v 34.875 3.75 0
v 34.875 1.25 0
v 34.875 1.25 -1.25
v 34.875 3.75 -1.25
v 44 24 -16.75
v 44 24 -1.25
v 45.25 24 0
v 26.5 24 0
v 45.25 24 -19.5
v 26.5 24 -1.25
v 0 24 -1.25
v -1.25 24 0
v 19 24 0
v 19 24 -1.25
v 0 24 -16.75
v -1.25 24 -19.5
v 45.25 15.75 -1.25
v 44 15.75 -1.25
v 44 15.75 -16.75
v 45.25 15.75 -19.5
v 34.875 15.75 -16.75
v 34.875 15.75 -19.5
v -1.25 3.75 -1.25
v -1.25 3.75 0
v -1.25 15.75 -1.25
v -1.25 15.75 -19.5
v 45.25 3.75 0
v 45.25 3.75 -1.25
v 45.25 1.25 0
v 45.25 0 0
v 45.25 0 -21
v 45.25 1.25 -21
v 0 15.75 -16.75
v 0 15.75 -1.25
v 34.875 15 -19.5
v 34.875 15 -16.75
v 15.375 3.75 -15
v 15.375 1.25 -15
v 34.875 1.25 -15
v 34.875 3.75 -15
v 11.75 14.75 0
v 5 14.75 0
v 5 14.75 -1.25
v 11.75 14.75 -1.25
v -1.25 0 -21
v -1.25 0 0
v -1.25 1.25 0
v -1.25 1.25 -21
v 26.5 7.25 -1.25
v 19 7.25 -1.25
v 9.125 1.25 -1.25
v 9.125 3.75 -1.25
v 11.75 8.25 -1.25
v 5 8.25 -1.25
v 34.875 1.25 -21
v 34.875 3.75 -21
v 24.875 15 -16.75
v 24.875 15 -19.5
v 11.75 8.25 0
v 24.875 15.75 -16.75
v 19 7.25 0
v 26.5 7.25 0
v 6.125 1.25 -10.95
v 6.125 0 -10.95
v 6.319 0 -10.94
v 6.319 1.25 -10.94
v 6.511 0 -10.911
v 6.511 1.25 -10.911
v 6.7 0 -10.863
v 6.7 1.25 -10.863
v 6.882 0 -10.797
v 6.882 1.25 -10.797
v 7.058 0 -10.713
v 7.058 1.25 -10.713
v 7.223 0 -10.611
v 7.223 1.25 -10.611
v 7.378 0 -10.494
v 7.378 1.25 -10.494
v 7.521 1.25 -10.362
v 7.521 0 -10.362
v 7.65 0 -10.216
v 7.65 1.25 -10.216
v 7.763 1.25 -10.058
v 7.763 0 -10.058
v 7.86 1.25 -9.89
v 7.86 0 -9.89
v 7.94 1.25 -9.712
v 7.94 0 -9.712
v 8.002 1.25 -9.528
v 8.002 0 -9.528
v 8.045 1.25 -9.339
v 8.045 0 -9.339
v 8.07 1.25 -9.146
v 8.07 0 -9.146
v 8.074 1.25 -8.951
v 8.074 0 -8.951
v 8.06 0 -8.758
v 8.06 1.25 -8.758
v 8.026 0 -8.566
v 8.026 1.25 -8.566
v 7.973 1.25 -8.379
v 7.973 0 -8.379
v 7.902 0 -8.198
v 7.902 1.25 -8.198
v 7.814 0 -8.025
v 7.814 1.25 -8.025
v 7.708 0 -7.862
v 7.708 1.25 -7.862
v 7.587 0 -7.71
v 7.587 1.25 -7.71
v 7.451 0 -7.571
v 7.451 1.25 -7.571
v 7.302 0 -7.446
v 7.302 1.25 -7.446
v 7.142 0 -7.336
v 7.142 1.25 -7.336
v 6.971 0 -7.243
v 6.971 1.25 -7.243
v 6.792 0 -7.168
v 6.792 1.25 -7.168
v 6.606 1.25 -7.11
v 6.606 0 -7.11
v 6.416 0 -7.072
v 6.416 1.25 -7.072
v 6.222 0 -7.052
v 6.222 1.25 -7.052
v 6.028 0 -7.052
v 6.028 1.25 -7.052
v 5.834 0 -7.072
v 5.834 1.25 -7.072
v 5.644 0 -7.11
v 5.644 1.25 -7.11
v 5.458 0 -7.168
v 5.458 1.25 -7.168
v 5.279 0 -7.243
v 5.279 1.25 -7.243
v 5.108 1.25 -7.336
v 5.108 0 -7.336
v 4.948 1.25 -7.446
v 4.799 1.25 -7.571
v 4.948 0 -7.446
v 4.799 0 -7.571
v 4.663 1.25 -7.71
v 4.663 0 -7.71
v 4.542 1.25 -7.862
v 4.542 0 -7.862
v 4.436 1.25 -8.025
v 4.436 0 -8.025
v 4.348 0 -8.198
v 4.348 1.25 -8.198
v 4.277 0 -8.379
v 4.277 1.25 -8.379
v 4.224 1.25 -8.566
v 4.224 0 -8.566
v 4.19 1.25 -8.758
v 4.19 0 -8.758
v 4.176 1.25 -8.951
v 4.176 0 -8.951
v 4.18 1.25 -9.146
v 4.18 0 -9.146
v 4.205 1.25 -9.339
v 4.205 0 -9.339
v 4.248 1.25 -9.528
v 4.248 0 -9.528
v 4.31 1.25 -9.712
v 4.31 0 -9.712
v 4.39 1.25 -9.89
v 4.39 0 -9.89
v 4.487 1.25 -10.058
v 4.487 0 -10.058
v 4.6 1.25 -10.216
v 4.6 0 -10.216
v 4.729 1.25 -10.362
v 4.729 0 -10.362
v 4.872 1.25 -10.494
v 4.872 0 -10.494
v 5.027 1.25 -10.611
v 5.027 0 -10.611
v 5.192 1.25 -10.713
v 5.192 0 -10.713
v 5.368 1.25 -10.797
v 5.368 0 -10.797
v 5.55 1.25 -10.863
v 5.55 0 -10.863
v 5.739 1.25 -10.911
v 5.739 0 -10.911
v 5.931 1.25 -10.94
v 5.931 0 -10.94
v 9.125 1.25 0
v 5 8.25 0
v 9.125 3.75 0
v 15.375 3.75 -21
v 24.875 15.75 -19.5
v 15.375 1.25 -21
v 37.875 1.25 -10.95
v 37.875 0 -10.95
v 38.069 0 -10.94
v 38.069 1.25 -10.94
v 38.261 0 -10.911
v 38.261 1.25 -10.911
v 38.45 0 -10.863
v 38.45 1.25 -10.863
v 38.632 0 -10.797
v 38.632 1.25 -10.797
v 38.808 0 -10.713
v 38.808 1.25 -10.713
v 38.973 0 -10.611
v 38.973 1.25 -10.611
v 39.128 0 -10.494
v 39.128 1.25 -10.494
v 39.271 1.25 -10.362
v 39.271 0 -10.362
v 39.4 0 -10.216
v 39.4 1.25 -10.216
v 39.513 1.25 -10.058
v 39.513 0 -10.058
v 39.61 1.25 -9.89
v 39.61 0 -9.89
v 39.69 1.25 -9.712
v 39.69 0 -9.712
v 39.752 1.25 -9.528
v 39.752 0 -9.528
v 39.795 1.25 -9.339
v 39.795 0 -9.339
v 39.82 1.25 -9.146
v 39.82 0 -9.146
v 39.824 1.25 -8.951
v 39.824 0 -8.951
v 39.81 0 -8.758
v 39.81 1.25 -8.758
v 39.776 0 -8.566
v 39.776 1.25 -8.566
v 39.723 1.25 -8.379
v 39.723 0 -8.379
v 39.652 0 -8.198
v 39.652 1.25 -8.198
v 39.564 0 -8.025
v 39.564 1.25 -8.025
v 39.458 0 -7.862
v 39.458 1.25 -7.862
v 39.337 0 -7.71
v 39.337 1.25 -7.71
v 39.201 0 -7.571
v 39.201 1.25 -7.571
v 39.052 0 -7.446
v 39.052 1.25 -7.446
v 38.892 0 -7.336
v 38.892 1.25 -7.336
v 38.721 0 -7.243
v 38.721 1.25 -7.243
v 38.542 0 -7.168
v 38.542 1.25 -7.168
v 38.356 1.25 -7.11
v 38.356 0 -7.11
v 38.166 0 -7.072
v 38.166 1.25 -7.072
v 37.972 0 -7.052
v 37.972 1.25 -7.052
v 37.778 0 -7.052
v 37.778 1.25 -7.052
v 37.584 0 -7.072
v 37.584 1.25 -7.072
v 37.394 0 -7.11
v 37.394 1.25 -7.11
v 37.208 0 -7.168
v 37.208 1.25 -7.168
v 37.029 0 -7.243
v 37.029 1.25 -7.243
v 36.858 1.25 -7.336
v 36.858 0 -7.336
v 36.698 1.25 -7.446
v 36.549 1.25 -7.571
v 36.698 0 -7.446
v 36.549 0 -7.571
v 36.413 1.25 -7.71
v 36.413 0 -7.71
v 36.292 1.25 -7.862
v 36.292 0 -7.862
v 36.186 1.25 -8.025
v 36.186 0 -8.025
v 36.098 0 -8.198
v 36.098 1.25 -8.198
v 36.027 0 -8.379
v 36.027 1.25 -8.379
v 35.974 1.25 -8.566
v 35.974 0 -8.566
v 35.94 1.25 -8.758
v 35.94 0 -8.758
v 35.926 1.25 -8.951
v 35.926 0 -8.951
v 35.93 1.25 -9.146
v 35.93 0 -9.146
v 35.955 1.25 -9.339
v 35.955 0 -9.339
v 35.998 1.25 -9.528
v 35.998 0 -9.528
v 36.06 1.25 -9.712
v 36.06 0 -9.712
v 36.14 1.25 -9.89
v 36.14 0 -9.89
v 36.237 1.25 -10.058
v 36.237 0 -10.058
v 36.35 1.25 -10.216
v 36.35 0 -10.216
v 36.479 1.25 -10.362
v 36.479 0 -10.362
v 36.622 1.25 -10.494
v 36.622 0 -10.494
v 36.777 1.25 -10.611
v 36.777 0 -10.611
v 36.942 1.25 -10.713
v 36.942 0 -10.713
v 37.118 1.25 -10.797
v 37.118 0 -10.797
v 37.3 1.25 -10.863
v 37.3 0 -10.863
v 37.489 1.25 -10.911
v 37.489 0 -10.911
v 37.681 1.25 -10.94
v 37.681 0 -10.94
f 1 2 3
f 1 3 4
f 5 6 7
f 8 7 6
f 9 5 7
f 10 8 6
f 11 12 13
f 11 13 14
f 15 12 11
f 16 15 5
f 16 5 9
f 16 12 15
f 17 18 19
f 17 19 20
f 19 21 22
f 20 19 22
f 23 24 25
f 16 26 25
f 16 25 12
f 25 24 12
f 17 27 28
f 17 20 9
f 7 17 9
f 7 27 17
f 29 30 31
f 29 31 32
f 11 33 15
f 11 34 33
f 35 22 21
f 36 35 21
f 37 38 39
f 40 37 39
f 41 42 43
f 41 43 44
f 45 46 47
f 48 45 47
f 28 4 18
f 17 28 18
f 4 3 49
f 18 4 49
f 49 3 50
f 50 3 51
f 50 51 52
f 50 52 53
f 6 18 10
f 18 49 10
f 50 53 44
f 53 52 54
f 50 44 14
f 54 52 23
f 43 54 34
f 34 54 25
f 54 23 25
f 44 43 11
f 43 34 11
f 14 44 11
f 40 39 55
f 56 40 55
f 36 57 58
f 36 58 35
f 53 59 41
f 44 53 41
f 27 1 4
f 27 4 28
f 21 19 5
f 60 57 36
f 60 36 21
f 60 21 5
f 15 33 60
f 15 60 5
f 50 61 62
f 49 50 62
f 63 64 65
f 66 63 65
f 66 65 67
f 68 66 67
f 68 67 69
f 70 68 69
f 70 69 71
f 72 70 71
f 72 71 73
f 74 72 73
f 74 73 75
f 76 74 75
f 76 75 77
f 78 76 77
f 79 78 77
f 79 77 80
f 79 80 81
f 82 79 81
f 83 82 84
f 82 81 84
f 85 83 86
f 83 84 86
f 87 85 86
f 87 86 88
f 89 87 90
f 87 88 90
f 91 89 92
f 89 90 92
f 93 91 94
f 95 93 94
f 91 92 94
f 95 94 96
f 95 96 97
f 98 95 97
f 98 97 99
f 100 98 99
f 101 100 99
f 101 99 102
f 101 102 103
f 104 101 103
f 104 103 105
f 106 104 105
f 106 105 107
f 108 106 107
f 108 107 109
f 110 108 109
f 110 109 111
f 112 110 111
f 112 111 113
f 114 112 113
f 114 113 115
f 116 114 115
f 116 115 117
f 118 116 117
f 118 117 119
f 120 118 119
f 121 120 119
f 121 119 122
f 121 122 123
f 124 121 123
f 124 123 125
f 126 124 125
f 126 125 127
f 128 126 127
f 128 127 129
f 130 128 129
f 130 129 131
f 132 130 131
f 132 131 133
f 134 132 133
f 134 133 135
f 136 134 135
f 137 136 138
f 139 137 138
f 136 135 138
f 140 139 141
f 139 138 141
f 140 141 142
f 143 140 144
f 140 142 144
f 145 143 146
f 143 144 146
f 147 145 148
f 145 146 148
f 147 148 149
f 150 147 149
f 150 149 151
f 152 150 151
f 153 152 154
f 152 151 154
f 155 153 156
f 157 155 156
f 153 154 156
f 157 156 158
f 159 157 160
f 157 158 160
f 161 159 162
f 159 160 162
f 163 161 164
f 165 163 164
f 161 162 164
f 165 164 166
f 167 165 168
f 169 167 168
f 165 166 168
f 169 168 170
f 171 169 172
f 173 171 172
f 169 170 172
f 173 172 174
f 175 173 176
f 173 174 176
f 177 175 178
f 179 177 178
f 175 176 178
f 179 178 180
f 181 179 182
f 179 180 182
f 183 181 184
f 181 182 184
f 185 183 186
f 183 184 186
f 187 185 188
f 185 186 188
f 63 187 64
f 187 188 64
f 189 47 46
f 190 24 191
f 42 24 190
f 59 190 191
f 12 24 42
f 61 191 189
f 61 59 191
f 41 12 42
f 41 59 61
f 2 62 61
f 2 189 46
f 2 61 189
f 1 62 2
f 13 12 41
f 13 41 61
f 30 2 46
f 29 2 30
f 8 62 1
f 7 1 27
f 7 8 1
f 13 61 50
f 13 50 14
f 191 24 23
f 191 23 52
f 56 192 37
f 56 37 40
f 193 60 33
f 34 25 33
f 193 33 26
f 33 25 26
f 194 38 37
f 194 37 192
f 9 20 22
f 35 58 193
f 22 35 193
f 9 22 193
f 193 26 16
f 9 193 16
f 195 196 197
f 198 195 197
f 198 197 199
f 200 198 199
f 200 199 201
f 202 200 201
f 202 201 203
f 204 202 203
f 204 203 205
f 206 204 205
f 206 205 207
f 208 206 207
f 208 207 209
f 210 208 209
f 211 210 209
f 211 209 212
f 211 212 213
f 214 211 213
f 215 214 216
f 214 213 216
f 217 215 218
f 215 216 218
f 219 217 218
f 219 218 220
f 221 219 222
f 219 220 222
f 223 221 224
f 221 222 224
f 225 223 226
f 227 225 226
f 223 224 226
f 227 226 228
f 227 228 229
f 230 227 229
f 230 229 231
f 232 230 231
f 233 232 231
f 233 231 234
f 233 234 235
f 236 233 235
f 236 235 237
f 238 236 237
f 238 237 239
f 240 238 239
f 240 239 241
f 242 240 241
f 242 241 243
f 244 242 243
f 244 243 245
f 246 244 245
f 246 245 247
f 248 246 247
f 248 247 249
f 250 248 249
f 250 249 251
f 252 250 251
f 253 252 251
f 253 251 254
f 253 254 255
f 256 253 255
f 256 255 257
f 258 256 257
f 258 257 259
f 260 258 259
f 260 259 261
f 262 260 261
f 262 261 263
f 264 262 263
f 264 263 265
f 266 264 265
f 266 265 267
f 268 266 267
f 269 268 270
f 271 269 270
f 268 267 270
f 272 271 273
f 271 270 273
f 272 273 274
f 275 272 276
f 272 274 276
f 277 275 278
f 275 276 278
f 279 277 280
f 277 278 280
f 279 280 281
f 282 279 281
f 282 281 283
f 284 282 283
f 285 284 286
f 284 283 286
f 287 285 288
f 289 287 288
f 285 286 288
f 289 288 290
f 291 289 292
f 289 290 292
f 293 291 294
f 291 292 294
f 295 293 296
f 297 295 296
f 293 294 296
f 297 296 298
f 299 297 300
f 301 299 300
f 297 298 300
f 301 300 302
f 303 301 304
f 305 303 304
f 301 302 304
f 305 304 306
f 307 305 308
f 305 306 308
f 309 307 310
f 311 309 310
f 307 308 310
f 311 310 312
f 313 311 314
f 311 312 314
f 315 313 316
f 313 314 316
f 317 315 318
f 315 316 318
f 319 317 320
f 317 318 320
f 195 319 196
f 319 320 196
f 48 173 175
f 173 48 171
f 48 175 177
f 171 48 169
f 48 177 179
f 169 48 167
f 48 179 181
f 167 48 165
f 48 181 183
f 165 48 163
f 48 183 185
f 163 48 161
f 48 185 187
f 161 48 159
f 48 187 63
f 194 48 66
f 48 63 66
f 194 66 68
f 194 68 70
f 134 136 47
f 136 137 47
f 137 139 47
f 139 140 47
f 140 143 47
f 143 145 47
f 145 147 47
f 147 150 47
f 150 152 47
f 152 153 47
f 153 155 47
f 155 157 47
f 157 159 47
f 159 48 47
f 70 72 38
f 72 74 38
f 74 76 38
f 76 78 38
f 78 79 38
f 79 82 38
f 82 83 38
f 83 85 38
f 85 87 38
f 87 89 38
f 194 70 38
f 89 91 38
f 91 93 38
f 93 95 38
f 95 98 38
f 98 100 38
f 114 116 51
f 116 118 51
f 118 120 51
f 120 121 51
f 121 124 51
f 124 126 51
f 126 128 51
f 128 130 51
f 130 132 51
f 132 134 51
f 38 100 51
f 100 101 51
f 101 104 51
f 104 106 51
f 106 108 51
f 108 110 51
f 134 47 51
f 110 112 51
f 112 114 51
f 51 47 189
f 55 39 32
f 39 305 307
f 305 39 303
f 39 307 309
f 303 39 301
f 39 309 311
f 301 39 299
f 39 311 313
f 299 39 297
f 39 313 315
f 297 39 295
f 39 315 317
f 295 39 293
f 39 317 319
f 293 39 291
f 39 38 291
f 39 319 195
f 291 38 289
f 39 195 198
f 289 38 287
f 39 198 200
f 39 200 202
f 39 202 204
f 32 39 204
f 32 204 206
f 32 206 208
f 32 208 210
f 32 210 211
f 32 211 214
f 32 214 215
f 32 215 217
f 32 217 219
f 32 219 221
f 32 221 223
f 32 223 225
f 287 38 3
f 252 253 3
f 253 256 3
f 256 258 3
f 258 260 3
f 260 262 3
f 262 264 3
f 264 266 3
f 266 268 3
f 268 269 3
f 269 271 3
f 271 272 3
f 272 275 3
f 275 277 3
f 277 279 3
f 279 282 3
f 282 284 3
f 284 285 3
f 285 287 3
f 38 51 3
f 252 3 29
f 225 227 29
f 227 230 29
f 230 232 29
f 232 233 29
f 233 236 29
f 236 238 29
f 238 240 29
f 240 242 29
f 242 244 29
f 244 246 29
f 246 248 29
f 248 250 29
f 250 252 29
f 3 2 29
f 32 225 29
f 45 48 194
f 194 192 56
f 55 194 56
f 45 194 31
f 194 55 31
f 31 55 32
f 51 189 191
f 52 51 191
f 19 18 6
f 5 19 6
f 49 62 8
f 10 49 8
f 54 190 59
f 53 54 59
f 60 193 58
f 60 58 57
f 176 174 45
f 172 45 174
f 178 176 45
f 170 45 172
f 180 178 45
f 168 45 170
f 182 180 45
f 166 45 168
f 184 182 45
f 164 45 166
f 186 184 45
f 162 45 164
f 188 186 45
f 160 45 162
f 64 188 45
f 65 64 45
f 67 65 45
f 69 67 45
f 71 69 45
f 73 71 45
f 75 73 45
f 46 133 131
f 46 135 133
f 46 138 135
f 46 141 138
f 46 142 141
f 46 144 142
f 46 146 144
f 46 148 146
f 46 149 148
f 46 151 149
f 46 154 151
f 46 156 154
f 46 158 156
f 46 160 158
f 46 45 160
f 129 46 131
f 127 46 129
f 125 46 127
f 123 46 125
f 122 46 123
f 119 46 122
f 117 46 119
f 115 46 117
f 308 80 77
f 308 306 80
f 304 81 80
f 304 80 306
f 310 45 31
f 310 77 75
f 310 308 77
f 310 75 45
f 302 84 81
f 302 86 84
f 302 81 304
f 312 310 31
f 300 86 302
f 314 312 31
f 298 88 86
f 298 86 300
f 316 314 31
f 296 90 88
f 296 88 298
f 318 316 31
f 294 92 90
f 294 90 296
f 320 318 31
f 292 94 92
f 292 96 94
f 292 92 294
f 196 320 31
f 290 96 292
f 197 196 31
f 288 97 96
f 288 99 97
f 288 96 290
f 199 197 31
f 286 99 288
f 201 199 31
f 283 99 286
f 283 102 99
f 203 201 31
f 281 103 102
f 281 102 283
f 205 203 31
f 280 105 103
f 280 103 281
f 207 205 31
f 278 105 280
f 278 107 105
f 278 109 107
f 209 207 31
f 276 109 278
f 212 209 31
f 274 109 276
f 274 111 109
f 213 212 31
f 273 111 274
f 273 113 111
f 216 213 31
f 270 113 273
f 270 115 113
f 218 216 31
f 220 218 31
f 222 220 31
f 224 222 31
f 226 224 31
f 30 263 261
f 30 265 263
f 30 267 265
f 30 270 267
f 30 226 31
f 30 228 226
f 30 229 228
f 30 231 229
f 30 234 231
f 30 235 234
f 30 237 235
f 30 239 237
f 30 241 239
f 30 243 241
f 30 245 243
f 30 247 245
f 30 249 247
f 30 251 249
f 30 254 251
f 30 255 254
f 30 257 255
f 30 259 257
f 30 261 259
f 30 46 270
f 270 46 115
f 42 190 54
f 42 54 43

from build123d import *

# Parameters (mm, degrees)
SKETCH1_W               = 46.5
SKETCH1_H               = 24
BOSS_EXTRUDE1_DEPTH     = 21
SHELL1_T                = -1.25
SKETCH2_W               = 19.75
SKETCH2_H               = 14.5
CUT_EXTRUDE1_DEPTH      = 57.384838388
SKETCH4_W               = 6.75
SKETCH4_H               = 6.5
SKETCH4_W_2             = 7.5
SKETCH4_H_2             = 17
CUT_EXTRUDE3_DEPTH      = 1.25
CUT_EXTRUDE4_REACH      = 57.358
SKETCH6_R               = 1.95
SKETCH7_W               = 10.375
SKETCH7_H               = 2.5
CUT_EXTRUDE5_DEPTH      = 1.25
SKETCH9_W               = 19.5
SKETCH9_H               = 6
BOSS_EXTRUDE3_DEPTH     = 2.5
CUT_EXTRUDE7_DEPTH      = 102.634838388
CUT_EXTRUDE7_DEPTH_BACK = 57.384838388
CUT_EXTRUDE7_START      = -45.25
SKETCH12_W              = 1.5
SKETCH12_H              = 8.25
SKETCH13_W              = 2.75
SKETCH13_H              = 8.25
BOSS_EXTRUDE4_DEPTH     = 44
SKETCH15_W              = 10
SKETCH15_H              = 2.75
BOSS_EXTRUDE5_DEPTH     = 0.75


with BuildPart() as part:
    # Sketch1 → Boss-Extrude1 (new body)
    with BuildSketch(Plane.XY):
        with Locations((22, 12)):
            Rectangle(SKETCH1_W, SKETCH1_H)
    extrude(amount=-BOSS_EXTRUDE1_DEPTH)

    # Shell1
    shell1_openings = [part.faces().sort_by_distance(p)[0] for p in [
        (22, 12, -21),
        (22, 24, -10.5),
    ]]
    offset(amount=SHELL1_T, openings=shell1_openings, kind=Kind.INTERSECTION)

    # Sketch2 → Cut-Extrude1 (cut, through all)
    with BuildSketch(Plane.ZY.offset(1.25)):
        with Locations((-11.125, 8.5)):
            Rectangle(SKETCH2_W, SKETCH2_H)
    extrude(amount=-CUT_EXTRUDE1_DEPTH, mode=Mode.SUBTRACT)

    # Sketch4 → Cut-Extrude3 (cut)
    with BuildSketch(Plane.XY):
        with Locations((8.375, 11.5)):
            Rectangle(SKETCH4_W, SKETCH4_H)
        with Locations((22.75, 15.75)):
            Rectangle(SKETCH4_W_2, SKETCH4_H_2)
    extrude(amount=-CUT_EXTRUDE3_DEPTH, mode=Mode.SUBTRACT)

    # Sketch6 → Cut-Extrude4 (cut, up to next)
    with BuildSketch(Plane(origin=(0, 0, 0), x_dir=(-1, 0, 0), z_dir=(0, -1, 0)), mode=Mode.PRIVATE) as cut_extrude4_sk1:
        with Locations(Location((-6.125, 9, 0), (0, 0, 90))):
            Circle(SKETCH6_R)
    cut_extrude4_tool1 = extrude(cut_extrude4_sk1.sketch, amount=-CUT_EXTRUDE4_REACH, mode=Mode.PRIVATE) & part.part
    # Sketch6 → Cut-Extrude4 (cut, up to next)
    with BuildSketch(Plane(origin=(0, 0, 0), x_dir=(-1, 0, 0), z_dir=(0, -1, 0)), mode=Mode.PRIVATE) as cut_extrude4_sk2:
        with Locations(Location((-37.875, 9, 0), (0, 0, 90))):
            Circle(SKETCH6_R)
    cut_extrude4_tool2 = extrude(cut_extrude4_sk2.sketch, amount=-CUT_EXTRUDE4_REACH, mode=Mode.PRIVATE) & part.part
    add(cut_extrude4_tool1.solids().sort_by_distance((6.125, 0, -9))[0], mode=Mode.SUBTRACT)
    add(cut_extrude4_tool2.solids().sort_by_distance((37.875, 0, -9))[0], mode=Mode.SUBTRACT)

    # Sketch7 → Cut-Extrude5 (cut)
    with BuildSketch(Plane.XY):
        with Locations((40.0625, 2.5)):
            Rectangle(SKETCH7_W, SKETCH7_H)
        with Locations((3.9375, 2.5)):
            Rectangle(SKETCH7_W, SKETCH7_H)
    extrude(amount=-CUT_EXTRUDE5_DEPTH, mode=Mode.SUBTRACT)

    # Sketch9 → Boss-Extrude3 (add)
    with BuildSketch(Plane(origin=(0, 1.25, 0), x_dir=(1, 0, 0), z_dir=(0, 1, 0))):
        with Locations((25.125, 18)):
            Rectangle(SKETCH9_W, SKETCH9_H)
    extrude(amount=BOSS_EXTRUDE3_DEPTH)

    # Sketch12 → Cut-Extrude7 (cut, two sides: drawn at the far end of the back side and taken through both)
    with BuildSketch(Plane(origin=(45.25, 0, 0), x_dir=(0, 0, -1), z_dir=(1, 0, 0)).offset(CUT_EXTRUDE7_START - CUT_EXTRUDE7_DEPTH_BACK)):
        with Locations((20.25, 19.875)):
            Rectangle(SKETCH12_W, SKETCH12_H)
    extrude(amount=CUT_EXTRUDE7_DEPTH + CUT_EXTRUDE7_DEPTH_BACK, mode=Mode.SUBTRACT)

    # Sketch13 → Boss-Extrude4 (add)
    with BuildSketch(Plane(origin=(0, 0, 0), x_dir=(0, 0, -1), z_dir=(1, 0, 0))):
        with Locations((18.125, 19.875)):
            Rectangle(SKETCH13_W, SKETCH13_H)
    extrude(amount=BOSS_EXTRUDE4_DEPTH)

    # Sketch15 → Boss-Extrude5 (add)
    with BuildSketch(Plane.XZ.offset(-15.75)):
        with Locations((29.875, -18.125)):
            Rectangle(SKETCH15_W, SKETCH15_H)
    extrude(amount=BOSS_EXTRUDE5_DEPTH)


solid = part.part
